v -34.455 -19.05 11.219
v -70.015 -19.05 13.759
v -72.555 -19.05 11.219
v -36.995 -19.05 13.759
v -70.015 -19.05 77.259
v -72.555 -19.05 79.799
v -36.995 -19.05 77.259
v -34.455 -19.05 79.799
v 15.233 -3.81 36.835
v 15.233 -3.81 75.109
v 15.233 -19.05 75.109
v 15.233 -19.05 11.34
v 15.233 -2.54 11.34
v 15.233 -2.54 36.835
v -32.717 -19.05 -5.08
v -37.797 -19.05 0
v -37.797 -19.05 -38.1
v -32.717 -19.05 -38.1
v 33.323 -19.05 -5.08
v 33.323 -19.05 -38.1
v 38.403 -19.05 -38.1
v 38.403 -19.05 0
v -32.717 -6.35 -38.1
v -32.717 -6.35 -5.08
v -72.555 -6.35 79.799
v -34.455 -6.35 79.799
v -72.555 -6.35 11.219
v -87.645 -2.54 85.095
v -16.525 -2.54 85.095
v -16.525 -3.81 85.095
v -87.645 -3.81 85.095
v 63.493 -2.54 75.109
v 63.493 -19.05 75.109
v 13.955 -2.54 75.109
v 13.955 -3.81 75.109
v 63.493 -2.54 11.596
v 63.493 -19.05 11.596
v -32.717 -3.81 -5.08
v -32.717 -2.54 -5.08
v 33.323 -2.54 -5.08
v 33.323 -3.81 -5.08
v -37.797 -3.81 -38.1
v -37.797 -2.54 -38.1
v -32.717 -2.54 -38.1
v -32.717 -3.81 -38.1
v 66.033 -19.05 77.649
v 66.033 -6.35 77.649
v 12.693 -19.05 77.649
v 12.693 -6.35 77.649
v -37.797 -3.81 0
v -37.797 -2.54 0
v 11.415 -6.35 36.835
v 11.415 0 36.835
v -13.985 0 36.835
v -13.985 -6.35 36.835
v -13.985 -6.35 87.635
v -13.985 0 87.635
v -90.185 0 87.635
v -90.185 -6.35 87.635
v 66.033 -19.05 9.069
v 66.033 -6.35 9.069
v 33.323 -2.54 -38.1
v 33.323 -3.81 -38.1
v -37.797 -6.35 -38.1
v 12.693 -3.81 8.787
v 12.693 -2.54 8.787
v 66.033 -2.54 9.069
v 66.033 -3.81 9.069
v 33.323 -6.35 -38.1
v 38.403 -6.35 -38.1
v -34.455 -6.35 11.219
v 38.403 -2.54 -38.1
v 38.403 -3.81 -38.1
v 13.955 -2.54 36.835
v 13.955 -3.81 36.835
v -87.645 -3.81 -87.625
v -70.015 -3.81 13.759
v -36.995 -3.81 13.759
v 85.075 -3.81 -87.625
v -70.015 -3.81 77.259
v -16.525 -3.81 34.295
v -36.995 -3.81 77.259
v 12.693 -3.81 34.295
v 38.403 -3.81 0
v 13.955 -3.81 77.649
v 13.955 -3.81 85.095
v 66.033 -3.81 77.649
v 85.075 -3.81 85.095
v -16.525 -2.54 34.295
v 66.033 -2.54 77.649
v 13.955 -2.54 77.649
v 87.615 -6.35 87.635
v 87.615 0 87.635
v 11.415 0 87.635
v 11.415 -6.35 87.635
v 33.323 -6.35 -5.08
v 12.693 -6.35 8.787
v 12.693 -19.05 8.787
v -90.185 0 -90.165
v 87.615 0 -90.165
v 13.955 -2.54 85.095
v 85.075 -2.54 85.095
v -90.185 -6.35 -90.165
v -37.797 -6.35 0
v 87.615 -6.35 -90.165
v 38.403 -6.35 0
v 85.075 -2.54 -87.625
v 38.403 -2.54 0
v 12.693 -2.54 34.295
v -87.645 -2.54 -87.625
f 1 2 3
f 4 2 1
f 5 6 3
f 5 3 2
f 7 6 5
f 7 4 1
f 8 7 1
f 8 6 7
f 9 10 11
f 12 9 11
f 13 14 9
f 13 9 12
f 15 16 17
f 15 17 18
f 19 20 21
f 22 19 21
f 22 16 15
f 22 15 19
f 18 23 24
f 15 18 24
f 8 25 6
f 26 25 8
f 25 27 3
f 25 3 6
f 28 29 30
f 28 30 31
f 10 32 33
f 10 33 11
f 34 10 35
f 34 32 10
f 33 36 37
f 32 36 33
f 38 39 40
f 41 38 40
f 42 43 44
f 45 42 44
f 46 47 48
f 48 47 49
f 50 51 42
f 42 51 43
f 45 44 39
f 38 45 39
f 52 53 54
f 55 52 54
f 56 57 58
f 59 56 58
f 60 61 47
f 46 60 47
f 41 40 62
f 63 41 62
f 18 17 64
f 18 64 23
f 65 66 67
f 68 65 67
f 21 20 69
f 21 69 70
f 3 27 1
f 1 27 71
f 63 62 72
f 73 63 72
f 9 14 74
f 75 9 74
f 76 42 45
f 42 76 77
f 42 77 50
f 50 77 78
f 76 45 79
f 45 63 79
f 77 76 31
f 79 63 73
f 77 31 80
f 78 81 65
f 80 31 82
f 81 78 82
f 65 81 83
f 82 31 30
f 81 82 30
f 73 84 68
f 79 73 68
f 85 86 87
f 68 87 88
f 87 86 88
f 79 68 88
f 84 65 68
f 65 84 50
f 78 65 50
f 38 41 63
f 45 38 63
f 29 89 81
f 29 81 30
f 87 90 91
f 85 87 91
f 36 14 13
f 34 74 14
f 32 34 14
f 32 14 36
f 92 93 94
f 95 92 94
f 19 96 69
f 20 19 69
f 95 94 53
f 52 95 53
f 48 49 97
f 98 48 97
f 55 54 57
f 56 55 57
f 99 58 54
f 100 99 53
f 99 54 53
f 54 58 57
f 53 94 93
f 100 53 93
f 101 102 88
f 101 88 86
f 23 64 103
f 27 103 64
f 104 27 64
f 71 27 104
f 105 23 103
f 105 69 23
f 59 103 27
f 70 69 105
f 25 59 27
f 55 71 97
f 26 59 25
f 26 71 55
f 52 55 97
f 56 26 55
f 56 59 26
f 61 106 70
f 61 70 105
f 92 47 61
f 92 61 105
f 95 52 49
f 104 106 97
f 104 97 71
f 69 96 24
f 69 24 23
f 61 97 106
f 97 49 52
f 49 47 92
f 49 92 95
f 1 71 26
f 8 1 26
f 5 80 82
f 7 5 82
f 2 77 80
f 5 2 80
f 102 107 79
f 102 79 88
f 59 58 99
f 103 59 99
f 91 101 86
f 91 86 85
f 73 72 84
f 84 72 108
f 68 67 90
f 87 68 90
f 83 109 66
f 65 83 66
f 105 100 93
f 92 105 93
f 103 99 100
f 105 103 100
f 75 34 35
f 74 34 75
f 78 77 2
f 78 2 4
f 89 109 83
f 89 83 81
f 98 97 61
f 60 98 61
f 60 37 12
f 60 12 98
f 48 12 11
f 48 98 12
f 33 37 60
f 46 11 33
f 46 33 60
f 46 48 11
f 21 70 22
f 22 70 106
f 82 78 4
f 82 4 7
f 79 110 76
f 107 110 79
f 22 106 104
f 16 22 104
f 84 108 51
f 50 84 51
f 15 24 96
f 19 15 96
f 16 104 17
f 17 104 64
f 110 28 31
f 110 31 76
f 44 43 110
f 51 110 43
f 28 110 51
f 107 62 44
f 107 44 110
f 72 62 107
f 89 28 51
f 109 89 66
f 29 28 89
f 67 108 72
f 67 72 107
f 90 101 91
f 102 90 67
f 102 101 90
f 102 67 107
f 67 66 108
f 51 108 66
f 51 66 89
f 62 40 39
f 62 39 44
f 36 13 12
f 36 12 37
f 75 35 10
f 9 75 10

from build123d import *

# Parameters (mm, degrees)
F1_DEPTH = 6.35
F2_W     = 38.1
F2_H     = 68.58
F3_DEPTH = 19.05
F4_T     = -2.54
F6_DEPTH = 19.05
F7_T     = -2.54
F9_DEPTH = 19.05


# Not quite as in the source:
# - a shell that OpenCascade refuses in one call is made with other operations: the cavity is built on its own and cut out


with BuildPart() as f1:
    # F0 (on Front) → F1 (new body)
    with BuildSketch(Plane.XZ):
        Polygon((-90.1848339975, 87.6345549519), (-90.1848339975, -90.1654450481), (87.6151660025, -90.1654450481), (87.6151660025, 87.6345549519), (11.4151660025, 87.6345549519), (11.4151660025, 36.8345549519), (-13.9848339975, 36.8345549519), (-13.9848339975, 87.6345549519), align=None)
    extrude(amount=F1_DEPTH)

    # F2 (on Front) → F3 (join)
    with BuildSketch(Plane.XZ):
        with Locations((-53.5051479423, 45.5094583845)):
            Rectangle(F2_W, F2_H)
    extrude(amount=F3_DEPTH)

    # F4
    f4_openings = [f1.faces().sort_by_distance(p)[0] for p in [
        (-53.505148, -19.05, 45.509458),
    ]]
    offset(amount=F4_T, openings=f4_openings, kind=Kind.INTERSECTION)

    # F5 (on Front) → F6 (join)
    with BuildSketch(Plane.XZ):
        Polygon((12.6932561398, 77.6492066986), (12.6932561398, 8.7867740487), (66.0325084011, 9.0692066986), (66.0325084011, 77.6492066986), align=None)
    extrude(amount=F6_DEPTH)

    # F7: a shell. OpenCascade refuses it in one call, so the cavity is built on its own and cut out:
    # the body offset inwards by the wall thickness, plus a prism from it out through each open face.
    f7_core = offset(f1.part, amount=F7_T, kind=Kind.INTERSECTION, mode=Mode.PRIVATE)
    f7_exits = [f7_core.faces().sort_by_distance(p)[0] for p in [
        (39.346735, -16.51, 43.288574),
    ]]
    add(f7_core, mode=Mode.SUBTRACT)
    extrude(f7_exits, amount=-F7_T, mode=Mode.SUBTRACT)

    # F8 (on Front) → F9 (join)
    with BuildSketch(Plane.XZ):
        Polygon((38.4033048588, 0), (-37.7966951412, 0), (-37.7966951412, -38.1), (-32.7166951412, -38.1), (-32.7166951412, -5.08), (33.3233048588, -5.08), (33.3233048588, -38.1), (38.4033048588, -38.1), align=None)
    extrude(amount=F9_DEPTH)


solid = f1.part
